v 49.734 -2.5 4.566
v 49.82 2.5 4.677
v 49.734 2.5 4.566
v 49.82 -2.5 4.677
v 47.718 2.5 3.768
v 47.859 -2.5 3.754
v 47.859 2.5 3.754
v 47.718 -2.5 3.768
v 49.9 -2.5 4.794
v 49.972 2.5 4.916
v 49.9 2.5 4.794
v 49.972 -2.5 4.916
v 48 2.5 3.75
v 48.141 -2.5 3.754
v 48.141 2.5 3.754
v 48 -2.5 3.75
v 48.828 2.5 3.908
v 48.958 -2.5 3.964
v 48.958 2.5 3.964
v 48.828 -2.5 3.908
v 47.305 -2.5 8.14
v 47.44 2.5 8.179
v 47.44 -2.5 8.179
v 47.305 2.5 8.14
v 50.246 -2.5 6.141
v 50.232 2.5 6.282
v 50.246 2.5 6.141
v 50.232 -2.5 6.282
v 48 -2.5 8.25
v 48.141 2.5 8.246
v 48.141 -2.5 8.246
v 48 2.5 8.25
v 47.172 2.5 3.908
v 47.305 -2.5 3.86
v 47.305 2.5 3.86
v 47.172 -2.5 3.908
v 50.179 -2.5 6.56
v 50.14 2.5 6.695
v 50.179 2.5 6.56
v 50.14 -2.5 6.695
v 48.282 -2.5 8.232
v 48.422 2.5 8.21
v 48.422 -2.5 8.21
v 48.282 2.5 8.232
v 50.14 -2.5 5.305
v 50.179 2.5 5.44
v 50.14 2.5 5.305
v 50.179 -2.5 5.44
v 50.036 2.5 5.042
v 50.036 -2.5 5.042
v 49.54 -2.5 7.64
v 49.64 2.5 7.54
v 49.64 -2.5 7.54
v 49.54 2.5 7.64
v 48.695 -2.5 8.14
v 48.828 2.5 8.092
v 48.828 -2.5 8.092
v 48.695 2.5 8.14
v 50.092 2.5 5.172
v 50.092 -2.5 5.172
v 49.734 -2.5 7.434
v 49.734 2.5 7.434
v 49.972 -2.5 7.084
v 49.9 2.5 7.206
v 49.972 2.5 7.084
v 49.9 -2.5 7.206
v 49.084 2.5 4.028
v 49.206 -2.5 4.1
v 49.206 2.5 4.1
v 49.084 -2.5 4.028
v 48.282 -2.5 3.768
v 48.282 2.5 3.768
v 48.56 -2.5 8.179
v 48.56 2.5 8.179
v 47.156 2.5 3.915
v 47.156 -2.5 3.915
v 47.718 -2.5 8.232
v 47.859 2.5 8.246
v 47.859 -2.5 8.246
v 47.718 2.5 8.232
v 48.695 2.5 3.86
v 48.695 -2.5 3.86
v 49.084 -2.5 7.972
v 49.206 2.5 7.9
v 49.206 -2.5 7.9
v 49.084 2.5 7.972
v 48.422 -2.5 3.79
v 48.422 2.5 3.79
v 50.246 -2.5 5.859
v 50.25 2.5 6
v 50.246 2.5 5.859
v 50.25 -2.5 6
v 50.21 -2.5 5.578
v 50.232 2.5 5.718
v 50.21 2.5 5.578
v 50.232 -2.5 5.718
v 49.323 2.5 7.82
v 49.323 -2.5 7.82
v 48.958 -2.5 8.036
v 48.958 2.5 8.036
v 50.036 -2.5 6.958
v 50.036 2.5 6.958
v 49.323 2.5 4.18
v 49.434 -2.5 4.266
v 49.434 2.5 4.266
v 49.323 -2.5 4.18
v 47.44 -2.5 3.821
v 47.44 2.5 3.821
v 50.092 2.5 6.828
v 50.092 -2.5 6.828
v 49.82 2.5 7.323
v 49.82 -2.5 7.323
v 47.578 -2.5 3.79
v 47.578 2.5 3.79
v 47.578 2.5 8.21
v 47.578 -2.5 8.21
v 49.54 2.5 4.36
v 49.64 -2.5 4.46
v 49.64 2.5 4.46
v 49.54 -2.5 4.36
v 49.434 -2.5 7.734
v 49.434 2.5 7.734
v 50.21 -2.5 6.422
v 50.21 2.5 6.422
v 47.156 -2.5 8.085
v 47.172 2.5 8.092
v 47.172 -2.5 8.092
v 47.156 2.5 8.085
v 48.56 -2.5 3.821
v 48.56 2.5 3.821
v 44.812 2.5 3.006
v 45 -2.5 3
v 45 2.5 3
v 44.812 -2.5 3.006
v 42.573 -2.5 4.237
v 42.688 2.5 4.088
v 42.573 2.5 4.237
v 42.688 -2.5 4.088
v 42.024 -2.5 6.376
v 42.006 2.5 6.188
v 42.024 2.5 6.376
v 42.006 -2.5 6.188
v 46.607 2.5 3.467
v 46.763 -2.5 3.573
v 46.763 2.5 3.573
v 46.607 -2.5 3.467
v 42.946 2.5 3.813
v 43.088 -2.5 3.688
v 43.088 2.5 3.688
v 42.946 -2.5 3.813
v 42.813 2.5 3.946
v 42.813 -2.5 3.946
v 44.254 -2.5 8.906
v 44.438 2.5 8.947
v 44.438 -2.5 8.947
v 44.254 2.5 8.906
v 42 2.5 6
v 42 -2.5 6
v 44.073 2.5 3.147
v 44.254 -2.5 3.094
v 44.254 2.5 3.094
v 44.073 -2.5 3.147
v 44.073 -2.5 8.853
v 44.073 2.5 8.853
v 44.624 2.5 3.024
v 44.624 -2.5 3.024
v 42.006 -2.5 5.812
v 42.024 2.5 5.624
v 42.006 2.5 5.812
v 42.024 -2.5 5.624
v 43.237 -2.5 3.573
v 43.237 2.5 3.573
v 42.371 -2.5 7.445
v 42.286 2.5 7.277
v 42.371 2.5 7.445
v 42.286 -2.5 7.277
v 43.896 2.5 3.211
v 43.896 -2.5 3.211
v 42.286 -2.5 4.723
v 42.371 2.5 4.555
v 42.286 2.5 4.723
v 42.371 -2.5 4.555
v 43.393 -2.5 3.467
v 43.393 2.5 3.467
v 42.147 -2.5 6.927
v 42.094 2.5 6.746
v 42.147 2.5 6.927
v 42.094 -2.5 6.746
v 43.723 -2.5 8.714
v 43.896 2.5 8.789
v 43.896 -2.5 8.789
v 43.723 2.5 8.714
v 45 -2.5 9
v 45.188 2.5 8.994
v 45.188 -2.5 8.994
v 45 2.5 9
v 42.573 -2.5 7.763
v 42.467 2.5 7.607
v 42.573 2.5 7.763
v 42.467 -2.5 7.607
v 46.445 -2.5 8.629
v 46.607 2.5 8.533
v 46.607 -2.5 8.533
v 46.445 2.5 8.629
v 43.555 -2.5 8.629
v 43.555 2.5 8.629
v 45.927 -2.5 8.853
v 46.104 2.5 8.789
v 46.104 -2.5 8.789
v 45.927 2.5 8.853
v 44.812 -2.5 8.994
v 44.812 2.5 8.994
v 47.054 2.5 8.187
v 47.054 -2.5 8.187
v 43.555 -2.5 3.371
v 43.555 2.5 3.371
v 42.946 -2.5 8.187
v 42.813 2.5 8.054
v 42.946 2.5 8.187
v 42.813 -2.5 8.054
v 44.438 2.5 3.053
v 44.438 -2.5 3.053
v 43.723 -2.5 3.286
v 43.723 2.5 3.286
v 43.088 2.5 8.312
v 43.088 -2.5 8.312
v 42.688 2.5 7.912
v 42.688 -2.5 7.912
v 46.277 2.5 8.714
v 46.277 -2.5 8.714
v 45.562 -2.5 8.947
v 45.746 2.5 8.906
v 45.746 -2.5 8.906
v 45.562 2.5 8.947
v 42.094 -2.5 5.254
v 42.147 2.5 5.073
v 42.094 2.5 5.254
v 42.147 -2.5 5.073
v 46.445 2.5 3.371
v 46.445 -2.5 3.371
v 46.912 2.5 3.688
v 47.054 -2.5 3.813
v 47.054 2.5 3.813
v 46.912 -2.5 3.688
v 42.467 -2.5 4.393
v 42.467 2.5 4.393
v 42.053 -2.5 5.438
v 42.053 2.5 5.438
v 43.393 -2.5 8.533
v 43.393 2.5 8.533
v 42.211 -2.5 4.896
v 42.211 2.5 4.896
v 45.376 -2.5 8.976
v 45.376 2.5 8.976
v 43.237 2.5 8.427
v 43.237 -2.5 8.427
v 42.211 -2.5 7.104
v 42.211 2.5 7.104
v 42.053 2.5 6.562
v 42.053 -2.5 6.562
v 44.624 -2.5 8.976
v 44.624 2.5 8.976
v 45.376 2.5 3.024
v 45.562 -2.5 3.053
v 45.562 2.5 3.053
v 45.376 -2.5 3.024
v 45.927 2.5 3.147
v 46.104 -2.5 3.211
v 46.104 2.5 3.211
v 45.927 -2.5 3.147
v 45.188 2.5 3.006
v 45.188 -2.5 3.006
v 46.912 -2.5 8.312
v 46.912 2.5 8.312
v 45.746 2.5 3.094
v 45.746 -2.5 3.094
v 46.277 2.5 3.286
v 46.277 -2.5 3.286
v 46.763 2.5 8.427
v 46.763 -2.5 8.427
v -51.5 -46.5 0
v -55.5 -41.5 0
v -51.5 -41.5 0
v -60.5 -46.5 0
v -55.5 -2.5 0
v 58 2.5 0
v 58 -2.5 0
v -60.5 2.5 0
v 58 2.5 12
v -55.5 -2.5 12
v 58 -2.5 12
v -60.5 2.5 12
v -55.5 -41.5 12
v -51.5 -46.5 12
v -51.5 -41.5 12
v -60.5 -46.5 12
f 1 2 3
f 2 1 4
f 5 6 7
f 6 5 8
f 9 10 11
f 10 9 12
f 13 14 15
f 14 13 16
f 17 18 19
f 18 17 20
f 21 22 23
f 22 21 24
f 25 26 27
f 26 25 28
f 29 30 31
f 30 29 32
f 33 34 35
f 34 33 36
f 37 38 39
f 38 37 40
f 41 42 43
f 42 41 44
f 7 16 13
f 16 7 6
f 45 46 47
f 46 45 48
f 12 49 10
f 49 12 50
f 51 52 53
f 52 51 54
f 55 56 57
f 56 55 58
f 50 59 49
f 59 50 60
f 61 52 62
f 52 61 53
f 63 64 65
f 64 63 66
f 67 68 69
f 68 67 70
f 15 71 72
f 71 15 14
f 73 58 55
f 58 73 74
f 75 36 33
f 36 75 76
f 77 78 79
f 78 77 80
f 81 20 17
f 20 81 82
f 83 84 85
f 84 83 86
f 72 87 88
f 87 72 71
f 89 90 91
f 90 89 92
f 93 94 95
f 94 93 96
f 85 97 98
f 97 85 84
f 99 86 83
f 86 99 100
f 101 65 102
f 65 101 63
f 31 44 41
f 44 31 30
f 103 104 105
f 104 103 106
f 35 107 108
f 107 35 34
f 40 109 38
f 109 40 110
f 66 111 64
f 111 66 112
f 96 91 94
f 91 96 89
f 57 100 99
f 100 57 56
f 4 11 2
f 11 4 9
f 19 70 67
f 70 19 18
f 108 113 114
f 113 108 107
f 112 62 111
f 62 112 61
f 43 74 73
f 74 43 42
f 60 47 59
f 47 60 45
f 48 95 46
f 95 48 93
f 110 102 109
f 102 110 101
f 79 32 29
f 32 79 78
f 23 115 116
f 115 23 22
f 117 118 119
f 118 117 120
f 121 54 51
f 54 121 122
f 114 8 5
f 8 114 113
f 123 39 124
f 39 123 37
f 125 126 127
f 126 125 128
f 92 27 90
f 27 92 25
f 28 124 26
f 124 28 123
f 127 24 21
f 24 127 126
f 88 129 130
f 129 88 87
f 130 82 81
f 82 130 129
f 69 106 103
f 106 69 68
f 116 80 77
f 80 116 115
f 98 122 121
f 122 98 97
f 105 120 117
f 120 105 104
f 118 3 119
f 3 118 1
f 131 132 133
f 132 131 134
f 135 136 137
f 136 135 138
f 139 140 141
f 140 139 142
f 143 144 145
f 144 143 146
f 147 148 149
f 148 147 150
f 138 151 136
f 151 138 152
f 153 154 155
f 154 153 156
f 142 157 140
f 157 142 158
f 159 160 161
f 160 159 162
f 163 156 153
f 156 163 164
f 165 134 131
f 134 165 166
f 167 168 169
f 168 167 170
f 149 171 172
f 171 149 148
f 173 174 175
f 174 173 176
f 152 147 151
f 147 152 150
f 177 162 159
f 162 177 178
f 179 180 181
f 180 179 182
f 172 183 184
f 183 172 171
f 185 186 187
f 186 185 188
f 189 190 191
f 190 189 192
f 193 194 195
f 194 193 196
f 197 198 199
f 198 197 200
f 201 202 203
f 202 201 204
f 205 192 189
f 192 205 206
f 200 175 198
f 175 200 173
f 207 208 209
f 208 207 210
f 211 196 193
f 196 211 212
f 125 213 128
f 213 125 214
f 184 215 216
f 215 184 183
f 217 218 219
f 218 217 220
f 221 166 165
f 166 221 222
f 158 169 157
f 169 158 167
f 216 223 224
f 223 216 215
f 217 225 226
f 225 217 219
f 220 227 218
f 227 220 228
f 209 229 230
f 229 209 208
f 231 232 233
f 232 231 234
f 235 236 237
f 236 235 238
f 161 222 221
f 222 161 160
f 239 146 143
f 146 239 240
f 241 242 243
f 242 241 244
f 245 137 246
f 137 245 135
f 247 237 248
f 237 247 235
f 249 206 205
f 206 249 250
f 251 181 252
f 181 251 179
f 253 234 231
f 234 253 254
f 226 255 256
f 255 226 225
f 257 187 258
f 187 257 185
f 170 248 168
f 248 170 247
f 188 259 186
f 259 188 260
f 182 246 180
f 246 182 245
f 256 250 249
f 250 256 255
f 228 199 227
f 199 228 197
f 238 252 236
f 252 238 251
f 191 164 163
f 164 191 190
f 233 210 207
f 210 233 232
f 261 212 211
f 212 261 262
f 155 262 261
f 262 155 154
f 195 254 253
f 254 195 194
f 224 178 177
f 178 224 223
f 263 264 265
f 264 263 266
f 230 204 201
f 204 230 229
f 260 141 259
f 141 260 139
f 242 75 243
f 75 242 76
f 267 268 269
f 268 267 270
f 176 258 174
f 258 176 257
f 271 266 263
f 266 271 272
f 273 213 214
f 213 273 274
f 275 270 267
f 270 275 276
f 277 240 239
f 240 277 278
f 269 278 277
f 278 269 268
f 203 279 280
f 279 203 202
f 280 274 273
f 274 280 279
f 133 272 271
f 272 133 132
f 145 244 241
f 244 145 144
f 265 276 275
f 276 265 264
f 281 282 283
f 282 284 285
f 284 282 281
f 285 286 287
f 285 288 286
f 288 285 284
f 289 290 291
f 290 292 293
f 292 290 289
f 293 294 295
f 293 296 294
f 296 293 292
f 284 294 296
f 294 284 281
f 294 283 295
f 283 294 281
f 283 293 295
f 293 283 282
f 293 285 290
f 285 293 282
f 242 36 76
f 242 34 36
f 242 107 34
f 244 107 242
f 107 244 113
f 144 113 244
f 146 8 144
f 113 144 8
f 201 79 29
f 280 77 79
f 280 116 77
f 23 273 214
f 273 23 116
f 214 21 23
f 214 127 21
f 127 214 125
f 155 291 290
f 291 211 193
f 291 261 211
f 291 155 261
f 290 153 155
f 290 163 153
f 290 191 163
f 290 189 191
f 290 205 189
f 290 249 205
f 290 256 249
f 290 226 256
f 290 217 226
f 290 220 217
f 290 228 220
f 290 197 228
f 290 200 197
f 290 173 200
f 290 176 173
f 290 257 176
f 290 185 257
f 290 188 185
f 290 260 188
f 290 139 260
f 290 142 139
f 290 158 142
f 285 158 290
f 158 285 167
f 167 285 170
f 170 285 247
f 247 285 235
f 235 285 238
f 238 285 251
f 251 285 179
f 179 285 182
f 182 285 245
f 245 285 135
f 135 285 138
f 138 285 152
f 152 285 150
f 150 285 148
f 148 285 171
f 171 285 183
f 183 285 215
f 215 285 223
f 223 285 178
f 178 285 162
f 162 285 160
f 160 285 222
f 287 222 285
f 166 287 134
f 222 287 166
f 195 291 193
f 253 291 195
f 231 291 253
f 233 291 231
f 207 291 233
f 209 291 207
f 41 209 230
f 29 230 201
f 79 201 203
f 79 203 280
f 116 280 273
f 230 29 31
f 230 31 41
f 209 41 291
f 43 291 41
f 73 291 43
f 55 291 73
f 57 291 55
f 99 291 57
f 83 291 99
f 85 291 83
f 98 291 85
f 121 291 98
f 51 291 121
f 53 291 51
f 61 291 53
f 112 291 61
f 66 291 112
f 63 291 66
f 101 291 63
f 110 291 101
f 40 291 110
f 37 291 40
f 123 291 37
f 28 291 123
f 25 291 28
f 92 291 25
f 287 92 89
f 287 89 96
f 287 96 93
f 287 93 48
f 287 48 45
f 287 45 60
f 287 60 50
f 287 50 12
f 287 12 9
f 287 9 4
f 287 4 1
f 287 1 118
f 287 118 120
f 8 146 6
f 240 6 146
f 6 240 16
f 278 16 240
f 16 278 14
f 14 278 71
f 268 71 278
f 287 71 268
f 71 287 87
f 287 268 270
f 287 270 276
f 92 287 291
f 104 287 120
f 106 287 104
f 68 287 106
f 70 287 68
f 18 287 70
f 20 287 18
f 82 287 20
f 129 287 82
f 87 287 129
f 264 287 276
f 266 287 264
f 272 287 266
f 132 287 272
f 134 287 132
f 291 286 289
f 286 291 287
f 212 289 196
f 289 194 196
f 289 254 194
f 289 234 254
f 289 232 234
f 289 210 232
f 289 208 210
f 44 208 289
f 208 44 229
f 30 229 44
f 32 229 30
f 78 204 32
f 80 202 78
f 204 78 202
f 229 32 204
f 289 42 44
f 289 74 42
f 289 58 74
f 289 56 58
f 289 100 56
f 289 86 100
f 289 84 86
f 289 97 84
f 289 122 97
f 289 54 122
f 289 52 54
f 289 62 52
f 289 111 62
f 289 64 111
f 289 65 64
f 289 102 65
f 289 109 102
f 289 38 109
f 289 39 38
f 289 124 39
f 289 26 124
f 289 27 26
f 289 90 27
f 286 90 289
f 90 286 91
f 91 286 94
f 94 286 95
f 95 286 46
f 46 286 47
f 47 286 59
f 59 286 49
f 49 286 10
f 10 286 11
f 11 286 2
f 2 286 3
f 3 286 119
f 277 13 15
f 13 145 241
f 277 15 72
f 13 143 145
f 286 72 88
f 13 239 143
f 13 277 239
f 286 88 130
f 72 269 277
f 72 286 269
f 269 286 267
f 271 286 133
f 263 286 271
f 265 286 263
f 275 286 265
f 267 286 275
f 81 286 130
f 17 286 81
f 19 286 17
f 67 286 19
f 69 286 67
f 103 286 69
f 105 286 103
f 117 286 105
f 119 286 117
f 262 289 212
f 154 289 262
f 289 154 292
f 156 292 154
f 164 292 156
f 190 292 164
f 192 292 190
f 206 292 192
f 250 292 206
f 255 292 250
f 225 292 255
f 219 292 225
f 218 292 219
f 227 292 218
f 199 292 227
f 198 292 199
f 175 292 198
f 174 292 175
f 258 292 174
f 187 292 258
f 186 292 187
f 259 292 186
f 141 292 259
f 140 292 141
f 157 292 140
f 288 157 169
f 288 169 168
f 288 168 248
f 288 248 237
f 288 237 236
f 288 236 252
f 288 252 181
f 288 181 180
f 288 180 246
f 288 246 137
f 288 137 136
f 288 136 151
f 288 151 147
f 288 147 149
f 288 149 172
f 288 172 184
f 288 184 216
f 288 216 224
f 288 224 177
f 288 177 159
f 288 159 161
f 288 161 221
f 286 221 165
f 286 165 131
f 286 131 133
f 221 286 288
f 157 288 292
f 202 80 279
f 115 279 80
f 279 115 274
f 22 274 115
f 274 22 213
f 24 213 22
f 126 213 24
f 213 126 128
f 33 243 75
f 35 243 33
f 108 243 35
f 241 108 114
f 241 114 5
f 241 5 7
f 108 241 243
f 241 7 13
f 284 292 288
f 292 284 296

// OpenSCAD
// file: config.scad
HEX_WIDTH= 125;
HEX_BORDER = 7;
HEX_HEIGHT = 38;
HEX_ARM = HEX_WIDTH / 6;
SHIELD_THICKNESS = 3;
SHIELD_DIFFUSER_PADDING = 3.4;

SNAPFIT_DEPTH = 12.5;
SNAPFIT_HEIGHT = 7.5;
// main file
include <config.scad>;

thickness = 12;
h = 116;
w = 5;
tol = 1;
lip = 4;

difference() {
    linear_extrude(thickness)
    union() {        
        square([h, w], center=true);

        translate([-h/2,-(HEX_HEIGHT+tol)/2,0])
        square([w,HEX_HEIGHT+tol+w], center=true);

        translate([-h/2+(lip/2), -(HEX_HEIGHT+tol+w), 0])
        square([w+lip, w], center=true);
    }
    
        
    translate([h/2 - 10, 50, thickness/2])
    union() {
        rotate([90, 90, 0])
        linear_extrude(100)
        circle(d=4.5, $fn=100);
        
        translate([-3, 0, 0])
        rotate([90, 90, 0])
        linear_extrude(100)
        circle(d=6, $fn=100);
    }
}
